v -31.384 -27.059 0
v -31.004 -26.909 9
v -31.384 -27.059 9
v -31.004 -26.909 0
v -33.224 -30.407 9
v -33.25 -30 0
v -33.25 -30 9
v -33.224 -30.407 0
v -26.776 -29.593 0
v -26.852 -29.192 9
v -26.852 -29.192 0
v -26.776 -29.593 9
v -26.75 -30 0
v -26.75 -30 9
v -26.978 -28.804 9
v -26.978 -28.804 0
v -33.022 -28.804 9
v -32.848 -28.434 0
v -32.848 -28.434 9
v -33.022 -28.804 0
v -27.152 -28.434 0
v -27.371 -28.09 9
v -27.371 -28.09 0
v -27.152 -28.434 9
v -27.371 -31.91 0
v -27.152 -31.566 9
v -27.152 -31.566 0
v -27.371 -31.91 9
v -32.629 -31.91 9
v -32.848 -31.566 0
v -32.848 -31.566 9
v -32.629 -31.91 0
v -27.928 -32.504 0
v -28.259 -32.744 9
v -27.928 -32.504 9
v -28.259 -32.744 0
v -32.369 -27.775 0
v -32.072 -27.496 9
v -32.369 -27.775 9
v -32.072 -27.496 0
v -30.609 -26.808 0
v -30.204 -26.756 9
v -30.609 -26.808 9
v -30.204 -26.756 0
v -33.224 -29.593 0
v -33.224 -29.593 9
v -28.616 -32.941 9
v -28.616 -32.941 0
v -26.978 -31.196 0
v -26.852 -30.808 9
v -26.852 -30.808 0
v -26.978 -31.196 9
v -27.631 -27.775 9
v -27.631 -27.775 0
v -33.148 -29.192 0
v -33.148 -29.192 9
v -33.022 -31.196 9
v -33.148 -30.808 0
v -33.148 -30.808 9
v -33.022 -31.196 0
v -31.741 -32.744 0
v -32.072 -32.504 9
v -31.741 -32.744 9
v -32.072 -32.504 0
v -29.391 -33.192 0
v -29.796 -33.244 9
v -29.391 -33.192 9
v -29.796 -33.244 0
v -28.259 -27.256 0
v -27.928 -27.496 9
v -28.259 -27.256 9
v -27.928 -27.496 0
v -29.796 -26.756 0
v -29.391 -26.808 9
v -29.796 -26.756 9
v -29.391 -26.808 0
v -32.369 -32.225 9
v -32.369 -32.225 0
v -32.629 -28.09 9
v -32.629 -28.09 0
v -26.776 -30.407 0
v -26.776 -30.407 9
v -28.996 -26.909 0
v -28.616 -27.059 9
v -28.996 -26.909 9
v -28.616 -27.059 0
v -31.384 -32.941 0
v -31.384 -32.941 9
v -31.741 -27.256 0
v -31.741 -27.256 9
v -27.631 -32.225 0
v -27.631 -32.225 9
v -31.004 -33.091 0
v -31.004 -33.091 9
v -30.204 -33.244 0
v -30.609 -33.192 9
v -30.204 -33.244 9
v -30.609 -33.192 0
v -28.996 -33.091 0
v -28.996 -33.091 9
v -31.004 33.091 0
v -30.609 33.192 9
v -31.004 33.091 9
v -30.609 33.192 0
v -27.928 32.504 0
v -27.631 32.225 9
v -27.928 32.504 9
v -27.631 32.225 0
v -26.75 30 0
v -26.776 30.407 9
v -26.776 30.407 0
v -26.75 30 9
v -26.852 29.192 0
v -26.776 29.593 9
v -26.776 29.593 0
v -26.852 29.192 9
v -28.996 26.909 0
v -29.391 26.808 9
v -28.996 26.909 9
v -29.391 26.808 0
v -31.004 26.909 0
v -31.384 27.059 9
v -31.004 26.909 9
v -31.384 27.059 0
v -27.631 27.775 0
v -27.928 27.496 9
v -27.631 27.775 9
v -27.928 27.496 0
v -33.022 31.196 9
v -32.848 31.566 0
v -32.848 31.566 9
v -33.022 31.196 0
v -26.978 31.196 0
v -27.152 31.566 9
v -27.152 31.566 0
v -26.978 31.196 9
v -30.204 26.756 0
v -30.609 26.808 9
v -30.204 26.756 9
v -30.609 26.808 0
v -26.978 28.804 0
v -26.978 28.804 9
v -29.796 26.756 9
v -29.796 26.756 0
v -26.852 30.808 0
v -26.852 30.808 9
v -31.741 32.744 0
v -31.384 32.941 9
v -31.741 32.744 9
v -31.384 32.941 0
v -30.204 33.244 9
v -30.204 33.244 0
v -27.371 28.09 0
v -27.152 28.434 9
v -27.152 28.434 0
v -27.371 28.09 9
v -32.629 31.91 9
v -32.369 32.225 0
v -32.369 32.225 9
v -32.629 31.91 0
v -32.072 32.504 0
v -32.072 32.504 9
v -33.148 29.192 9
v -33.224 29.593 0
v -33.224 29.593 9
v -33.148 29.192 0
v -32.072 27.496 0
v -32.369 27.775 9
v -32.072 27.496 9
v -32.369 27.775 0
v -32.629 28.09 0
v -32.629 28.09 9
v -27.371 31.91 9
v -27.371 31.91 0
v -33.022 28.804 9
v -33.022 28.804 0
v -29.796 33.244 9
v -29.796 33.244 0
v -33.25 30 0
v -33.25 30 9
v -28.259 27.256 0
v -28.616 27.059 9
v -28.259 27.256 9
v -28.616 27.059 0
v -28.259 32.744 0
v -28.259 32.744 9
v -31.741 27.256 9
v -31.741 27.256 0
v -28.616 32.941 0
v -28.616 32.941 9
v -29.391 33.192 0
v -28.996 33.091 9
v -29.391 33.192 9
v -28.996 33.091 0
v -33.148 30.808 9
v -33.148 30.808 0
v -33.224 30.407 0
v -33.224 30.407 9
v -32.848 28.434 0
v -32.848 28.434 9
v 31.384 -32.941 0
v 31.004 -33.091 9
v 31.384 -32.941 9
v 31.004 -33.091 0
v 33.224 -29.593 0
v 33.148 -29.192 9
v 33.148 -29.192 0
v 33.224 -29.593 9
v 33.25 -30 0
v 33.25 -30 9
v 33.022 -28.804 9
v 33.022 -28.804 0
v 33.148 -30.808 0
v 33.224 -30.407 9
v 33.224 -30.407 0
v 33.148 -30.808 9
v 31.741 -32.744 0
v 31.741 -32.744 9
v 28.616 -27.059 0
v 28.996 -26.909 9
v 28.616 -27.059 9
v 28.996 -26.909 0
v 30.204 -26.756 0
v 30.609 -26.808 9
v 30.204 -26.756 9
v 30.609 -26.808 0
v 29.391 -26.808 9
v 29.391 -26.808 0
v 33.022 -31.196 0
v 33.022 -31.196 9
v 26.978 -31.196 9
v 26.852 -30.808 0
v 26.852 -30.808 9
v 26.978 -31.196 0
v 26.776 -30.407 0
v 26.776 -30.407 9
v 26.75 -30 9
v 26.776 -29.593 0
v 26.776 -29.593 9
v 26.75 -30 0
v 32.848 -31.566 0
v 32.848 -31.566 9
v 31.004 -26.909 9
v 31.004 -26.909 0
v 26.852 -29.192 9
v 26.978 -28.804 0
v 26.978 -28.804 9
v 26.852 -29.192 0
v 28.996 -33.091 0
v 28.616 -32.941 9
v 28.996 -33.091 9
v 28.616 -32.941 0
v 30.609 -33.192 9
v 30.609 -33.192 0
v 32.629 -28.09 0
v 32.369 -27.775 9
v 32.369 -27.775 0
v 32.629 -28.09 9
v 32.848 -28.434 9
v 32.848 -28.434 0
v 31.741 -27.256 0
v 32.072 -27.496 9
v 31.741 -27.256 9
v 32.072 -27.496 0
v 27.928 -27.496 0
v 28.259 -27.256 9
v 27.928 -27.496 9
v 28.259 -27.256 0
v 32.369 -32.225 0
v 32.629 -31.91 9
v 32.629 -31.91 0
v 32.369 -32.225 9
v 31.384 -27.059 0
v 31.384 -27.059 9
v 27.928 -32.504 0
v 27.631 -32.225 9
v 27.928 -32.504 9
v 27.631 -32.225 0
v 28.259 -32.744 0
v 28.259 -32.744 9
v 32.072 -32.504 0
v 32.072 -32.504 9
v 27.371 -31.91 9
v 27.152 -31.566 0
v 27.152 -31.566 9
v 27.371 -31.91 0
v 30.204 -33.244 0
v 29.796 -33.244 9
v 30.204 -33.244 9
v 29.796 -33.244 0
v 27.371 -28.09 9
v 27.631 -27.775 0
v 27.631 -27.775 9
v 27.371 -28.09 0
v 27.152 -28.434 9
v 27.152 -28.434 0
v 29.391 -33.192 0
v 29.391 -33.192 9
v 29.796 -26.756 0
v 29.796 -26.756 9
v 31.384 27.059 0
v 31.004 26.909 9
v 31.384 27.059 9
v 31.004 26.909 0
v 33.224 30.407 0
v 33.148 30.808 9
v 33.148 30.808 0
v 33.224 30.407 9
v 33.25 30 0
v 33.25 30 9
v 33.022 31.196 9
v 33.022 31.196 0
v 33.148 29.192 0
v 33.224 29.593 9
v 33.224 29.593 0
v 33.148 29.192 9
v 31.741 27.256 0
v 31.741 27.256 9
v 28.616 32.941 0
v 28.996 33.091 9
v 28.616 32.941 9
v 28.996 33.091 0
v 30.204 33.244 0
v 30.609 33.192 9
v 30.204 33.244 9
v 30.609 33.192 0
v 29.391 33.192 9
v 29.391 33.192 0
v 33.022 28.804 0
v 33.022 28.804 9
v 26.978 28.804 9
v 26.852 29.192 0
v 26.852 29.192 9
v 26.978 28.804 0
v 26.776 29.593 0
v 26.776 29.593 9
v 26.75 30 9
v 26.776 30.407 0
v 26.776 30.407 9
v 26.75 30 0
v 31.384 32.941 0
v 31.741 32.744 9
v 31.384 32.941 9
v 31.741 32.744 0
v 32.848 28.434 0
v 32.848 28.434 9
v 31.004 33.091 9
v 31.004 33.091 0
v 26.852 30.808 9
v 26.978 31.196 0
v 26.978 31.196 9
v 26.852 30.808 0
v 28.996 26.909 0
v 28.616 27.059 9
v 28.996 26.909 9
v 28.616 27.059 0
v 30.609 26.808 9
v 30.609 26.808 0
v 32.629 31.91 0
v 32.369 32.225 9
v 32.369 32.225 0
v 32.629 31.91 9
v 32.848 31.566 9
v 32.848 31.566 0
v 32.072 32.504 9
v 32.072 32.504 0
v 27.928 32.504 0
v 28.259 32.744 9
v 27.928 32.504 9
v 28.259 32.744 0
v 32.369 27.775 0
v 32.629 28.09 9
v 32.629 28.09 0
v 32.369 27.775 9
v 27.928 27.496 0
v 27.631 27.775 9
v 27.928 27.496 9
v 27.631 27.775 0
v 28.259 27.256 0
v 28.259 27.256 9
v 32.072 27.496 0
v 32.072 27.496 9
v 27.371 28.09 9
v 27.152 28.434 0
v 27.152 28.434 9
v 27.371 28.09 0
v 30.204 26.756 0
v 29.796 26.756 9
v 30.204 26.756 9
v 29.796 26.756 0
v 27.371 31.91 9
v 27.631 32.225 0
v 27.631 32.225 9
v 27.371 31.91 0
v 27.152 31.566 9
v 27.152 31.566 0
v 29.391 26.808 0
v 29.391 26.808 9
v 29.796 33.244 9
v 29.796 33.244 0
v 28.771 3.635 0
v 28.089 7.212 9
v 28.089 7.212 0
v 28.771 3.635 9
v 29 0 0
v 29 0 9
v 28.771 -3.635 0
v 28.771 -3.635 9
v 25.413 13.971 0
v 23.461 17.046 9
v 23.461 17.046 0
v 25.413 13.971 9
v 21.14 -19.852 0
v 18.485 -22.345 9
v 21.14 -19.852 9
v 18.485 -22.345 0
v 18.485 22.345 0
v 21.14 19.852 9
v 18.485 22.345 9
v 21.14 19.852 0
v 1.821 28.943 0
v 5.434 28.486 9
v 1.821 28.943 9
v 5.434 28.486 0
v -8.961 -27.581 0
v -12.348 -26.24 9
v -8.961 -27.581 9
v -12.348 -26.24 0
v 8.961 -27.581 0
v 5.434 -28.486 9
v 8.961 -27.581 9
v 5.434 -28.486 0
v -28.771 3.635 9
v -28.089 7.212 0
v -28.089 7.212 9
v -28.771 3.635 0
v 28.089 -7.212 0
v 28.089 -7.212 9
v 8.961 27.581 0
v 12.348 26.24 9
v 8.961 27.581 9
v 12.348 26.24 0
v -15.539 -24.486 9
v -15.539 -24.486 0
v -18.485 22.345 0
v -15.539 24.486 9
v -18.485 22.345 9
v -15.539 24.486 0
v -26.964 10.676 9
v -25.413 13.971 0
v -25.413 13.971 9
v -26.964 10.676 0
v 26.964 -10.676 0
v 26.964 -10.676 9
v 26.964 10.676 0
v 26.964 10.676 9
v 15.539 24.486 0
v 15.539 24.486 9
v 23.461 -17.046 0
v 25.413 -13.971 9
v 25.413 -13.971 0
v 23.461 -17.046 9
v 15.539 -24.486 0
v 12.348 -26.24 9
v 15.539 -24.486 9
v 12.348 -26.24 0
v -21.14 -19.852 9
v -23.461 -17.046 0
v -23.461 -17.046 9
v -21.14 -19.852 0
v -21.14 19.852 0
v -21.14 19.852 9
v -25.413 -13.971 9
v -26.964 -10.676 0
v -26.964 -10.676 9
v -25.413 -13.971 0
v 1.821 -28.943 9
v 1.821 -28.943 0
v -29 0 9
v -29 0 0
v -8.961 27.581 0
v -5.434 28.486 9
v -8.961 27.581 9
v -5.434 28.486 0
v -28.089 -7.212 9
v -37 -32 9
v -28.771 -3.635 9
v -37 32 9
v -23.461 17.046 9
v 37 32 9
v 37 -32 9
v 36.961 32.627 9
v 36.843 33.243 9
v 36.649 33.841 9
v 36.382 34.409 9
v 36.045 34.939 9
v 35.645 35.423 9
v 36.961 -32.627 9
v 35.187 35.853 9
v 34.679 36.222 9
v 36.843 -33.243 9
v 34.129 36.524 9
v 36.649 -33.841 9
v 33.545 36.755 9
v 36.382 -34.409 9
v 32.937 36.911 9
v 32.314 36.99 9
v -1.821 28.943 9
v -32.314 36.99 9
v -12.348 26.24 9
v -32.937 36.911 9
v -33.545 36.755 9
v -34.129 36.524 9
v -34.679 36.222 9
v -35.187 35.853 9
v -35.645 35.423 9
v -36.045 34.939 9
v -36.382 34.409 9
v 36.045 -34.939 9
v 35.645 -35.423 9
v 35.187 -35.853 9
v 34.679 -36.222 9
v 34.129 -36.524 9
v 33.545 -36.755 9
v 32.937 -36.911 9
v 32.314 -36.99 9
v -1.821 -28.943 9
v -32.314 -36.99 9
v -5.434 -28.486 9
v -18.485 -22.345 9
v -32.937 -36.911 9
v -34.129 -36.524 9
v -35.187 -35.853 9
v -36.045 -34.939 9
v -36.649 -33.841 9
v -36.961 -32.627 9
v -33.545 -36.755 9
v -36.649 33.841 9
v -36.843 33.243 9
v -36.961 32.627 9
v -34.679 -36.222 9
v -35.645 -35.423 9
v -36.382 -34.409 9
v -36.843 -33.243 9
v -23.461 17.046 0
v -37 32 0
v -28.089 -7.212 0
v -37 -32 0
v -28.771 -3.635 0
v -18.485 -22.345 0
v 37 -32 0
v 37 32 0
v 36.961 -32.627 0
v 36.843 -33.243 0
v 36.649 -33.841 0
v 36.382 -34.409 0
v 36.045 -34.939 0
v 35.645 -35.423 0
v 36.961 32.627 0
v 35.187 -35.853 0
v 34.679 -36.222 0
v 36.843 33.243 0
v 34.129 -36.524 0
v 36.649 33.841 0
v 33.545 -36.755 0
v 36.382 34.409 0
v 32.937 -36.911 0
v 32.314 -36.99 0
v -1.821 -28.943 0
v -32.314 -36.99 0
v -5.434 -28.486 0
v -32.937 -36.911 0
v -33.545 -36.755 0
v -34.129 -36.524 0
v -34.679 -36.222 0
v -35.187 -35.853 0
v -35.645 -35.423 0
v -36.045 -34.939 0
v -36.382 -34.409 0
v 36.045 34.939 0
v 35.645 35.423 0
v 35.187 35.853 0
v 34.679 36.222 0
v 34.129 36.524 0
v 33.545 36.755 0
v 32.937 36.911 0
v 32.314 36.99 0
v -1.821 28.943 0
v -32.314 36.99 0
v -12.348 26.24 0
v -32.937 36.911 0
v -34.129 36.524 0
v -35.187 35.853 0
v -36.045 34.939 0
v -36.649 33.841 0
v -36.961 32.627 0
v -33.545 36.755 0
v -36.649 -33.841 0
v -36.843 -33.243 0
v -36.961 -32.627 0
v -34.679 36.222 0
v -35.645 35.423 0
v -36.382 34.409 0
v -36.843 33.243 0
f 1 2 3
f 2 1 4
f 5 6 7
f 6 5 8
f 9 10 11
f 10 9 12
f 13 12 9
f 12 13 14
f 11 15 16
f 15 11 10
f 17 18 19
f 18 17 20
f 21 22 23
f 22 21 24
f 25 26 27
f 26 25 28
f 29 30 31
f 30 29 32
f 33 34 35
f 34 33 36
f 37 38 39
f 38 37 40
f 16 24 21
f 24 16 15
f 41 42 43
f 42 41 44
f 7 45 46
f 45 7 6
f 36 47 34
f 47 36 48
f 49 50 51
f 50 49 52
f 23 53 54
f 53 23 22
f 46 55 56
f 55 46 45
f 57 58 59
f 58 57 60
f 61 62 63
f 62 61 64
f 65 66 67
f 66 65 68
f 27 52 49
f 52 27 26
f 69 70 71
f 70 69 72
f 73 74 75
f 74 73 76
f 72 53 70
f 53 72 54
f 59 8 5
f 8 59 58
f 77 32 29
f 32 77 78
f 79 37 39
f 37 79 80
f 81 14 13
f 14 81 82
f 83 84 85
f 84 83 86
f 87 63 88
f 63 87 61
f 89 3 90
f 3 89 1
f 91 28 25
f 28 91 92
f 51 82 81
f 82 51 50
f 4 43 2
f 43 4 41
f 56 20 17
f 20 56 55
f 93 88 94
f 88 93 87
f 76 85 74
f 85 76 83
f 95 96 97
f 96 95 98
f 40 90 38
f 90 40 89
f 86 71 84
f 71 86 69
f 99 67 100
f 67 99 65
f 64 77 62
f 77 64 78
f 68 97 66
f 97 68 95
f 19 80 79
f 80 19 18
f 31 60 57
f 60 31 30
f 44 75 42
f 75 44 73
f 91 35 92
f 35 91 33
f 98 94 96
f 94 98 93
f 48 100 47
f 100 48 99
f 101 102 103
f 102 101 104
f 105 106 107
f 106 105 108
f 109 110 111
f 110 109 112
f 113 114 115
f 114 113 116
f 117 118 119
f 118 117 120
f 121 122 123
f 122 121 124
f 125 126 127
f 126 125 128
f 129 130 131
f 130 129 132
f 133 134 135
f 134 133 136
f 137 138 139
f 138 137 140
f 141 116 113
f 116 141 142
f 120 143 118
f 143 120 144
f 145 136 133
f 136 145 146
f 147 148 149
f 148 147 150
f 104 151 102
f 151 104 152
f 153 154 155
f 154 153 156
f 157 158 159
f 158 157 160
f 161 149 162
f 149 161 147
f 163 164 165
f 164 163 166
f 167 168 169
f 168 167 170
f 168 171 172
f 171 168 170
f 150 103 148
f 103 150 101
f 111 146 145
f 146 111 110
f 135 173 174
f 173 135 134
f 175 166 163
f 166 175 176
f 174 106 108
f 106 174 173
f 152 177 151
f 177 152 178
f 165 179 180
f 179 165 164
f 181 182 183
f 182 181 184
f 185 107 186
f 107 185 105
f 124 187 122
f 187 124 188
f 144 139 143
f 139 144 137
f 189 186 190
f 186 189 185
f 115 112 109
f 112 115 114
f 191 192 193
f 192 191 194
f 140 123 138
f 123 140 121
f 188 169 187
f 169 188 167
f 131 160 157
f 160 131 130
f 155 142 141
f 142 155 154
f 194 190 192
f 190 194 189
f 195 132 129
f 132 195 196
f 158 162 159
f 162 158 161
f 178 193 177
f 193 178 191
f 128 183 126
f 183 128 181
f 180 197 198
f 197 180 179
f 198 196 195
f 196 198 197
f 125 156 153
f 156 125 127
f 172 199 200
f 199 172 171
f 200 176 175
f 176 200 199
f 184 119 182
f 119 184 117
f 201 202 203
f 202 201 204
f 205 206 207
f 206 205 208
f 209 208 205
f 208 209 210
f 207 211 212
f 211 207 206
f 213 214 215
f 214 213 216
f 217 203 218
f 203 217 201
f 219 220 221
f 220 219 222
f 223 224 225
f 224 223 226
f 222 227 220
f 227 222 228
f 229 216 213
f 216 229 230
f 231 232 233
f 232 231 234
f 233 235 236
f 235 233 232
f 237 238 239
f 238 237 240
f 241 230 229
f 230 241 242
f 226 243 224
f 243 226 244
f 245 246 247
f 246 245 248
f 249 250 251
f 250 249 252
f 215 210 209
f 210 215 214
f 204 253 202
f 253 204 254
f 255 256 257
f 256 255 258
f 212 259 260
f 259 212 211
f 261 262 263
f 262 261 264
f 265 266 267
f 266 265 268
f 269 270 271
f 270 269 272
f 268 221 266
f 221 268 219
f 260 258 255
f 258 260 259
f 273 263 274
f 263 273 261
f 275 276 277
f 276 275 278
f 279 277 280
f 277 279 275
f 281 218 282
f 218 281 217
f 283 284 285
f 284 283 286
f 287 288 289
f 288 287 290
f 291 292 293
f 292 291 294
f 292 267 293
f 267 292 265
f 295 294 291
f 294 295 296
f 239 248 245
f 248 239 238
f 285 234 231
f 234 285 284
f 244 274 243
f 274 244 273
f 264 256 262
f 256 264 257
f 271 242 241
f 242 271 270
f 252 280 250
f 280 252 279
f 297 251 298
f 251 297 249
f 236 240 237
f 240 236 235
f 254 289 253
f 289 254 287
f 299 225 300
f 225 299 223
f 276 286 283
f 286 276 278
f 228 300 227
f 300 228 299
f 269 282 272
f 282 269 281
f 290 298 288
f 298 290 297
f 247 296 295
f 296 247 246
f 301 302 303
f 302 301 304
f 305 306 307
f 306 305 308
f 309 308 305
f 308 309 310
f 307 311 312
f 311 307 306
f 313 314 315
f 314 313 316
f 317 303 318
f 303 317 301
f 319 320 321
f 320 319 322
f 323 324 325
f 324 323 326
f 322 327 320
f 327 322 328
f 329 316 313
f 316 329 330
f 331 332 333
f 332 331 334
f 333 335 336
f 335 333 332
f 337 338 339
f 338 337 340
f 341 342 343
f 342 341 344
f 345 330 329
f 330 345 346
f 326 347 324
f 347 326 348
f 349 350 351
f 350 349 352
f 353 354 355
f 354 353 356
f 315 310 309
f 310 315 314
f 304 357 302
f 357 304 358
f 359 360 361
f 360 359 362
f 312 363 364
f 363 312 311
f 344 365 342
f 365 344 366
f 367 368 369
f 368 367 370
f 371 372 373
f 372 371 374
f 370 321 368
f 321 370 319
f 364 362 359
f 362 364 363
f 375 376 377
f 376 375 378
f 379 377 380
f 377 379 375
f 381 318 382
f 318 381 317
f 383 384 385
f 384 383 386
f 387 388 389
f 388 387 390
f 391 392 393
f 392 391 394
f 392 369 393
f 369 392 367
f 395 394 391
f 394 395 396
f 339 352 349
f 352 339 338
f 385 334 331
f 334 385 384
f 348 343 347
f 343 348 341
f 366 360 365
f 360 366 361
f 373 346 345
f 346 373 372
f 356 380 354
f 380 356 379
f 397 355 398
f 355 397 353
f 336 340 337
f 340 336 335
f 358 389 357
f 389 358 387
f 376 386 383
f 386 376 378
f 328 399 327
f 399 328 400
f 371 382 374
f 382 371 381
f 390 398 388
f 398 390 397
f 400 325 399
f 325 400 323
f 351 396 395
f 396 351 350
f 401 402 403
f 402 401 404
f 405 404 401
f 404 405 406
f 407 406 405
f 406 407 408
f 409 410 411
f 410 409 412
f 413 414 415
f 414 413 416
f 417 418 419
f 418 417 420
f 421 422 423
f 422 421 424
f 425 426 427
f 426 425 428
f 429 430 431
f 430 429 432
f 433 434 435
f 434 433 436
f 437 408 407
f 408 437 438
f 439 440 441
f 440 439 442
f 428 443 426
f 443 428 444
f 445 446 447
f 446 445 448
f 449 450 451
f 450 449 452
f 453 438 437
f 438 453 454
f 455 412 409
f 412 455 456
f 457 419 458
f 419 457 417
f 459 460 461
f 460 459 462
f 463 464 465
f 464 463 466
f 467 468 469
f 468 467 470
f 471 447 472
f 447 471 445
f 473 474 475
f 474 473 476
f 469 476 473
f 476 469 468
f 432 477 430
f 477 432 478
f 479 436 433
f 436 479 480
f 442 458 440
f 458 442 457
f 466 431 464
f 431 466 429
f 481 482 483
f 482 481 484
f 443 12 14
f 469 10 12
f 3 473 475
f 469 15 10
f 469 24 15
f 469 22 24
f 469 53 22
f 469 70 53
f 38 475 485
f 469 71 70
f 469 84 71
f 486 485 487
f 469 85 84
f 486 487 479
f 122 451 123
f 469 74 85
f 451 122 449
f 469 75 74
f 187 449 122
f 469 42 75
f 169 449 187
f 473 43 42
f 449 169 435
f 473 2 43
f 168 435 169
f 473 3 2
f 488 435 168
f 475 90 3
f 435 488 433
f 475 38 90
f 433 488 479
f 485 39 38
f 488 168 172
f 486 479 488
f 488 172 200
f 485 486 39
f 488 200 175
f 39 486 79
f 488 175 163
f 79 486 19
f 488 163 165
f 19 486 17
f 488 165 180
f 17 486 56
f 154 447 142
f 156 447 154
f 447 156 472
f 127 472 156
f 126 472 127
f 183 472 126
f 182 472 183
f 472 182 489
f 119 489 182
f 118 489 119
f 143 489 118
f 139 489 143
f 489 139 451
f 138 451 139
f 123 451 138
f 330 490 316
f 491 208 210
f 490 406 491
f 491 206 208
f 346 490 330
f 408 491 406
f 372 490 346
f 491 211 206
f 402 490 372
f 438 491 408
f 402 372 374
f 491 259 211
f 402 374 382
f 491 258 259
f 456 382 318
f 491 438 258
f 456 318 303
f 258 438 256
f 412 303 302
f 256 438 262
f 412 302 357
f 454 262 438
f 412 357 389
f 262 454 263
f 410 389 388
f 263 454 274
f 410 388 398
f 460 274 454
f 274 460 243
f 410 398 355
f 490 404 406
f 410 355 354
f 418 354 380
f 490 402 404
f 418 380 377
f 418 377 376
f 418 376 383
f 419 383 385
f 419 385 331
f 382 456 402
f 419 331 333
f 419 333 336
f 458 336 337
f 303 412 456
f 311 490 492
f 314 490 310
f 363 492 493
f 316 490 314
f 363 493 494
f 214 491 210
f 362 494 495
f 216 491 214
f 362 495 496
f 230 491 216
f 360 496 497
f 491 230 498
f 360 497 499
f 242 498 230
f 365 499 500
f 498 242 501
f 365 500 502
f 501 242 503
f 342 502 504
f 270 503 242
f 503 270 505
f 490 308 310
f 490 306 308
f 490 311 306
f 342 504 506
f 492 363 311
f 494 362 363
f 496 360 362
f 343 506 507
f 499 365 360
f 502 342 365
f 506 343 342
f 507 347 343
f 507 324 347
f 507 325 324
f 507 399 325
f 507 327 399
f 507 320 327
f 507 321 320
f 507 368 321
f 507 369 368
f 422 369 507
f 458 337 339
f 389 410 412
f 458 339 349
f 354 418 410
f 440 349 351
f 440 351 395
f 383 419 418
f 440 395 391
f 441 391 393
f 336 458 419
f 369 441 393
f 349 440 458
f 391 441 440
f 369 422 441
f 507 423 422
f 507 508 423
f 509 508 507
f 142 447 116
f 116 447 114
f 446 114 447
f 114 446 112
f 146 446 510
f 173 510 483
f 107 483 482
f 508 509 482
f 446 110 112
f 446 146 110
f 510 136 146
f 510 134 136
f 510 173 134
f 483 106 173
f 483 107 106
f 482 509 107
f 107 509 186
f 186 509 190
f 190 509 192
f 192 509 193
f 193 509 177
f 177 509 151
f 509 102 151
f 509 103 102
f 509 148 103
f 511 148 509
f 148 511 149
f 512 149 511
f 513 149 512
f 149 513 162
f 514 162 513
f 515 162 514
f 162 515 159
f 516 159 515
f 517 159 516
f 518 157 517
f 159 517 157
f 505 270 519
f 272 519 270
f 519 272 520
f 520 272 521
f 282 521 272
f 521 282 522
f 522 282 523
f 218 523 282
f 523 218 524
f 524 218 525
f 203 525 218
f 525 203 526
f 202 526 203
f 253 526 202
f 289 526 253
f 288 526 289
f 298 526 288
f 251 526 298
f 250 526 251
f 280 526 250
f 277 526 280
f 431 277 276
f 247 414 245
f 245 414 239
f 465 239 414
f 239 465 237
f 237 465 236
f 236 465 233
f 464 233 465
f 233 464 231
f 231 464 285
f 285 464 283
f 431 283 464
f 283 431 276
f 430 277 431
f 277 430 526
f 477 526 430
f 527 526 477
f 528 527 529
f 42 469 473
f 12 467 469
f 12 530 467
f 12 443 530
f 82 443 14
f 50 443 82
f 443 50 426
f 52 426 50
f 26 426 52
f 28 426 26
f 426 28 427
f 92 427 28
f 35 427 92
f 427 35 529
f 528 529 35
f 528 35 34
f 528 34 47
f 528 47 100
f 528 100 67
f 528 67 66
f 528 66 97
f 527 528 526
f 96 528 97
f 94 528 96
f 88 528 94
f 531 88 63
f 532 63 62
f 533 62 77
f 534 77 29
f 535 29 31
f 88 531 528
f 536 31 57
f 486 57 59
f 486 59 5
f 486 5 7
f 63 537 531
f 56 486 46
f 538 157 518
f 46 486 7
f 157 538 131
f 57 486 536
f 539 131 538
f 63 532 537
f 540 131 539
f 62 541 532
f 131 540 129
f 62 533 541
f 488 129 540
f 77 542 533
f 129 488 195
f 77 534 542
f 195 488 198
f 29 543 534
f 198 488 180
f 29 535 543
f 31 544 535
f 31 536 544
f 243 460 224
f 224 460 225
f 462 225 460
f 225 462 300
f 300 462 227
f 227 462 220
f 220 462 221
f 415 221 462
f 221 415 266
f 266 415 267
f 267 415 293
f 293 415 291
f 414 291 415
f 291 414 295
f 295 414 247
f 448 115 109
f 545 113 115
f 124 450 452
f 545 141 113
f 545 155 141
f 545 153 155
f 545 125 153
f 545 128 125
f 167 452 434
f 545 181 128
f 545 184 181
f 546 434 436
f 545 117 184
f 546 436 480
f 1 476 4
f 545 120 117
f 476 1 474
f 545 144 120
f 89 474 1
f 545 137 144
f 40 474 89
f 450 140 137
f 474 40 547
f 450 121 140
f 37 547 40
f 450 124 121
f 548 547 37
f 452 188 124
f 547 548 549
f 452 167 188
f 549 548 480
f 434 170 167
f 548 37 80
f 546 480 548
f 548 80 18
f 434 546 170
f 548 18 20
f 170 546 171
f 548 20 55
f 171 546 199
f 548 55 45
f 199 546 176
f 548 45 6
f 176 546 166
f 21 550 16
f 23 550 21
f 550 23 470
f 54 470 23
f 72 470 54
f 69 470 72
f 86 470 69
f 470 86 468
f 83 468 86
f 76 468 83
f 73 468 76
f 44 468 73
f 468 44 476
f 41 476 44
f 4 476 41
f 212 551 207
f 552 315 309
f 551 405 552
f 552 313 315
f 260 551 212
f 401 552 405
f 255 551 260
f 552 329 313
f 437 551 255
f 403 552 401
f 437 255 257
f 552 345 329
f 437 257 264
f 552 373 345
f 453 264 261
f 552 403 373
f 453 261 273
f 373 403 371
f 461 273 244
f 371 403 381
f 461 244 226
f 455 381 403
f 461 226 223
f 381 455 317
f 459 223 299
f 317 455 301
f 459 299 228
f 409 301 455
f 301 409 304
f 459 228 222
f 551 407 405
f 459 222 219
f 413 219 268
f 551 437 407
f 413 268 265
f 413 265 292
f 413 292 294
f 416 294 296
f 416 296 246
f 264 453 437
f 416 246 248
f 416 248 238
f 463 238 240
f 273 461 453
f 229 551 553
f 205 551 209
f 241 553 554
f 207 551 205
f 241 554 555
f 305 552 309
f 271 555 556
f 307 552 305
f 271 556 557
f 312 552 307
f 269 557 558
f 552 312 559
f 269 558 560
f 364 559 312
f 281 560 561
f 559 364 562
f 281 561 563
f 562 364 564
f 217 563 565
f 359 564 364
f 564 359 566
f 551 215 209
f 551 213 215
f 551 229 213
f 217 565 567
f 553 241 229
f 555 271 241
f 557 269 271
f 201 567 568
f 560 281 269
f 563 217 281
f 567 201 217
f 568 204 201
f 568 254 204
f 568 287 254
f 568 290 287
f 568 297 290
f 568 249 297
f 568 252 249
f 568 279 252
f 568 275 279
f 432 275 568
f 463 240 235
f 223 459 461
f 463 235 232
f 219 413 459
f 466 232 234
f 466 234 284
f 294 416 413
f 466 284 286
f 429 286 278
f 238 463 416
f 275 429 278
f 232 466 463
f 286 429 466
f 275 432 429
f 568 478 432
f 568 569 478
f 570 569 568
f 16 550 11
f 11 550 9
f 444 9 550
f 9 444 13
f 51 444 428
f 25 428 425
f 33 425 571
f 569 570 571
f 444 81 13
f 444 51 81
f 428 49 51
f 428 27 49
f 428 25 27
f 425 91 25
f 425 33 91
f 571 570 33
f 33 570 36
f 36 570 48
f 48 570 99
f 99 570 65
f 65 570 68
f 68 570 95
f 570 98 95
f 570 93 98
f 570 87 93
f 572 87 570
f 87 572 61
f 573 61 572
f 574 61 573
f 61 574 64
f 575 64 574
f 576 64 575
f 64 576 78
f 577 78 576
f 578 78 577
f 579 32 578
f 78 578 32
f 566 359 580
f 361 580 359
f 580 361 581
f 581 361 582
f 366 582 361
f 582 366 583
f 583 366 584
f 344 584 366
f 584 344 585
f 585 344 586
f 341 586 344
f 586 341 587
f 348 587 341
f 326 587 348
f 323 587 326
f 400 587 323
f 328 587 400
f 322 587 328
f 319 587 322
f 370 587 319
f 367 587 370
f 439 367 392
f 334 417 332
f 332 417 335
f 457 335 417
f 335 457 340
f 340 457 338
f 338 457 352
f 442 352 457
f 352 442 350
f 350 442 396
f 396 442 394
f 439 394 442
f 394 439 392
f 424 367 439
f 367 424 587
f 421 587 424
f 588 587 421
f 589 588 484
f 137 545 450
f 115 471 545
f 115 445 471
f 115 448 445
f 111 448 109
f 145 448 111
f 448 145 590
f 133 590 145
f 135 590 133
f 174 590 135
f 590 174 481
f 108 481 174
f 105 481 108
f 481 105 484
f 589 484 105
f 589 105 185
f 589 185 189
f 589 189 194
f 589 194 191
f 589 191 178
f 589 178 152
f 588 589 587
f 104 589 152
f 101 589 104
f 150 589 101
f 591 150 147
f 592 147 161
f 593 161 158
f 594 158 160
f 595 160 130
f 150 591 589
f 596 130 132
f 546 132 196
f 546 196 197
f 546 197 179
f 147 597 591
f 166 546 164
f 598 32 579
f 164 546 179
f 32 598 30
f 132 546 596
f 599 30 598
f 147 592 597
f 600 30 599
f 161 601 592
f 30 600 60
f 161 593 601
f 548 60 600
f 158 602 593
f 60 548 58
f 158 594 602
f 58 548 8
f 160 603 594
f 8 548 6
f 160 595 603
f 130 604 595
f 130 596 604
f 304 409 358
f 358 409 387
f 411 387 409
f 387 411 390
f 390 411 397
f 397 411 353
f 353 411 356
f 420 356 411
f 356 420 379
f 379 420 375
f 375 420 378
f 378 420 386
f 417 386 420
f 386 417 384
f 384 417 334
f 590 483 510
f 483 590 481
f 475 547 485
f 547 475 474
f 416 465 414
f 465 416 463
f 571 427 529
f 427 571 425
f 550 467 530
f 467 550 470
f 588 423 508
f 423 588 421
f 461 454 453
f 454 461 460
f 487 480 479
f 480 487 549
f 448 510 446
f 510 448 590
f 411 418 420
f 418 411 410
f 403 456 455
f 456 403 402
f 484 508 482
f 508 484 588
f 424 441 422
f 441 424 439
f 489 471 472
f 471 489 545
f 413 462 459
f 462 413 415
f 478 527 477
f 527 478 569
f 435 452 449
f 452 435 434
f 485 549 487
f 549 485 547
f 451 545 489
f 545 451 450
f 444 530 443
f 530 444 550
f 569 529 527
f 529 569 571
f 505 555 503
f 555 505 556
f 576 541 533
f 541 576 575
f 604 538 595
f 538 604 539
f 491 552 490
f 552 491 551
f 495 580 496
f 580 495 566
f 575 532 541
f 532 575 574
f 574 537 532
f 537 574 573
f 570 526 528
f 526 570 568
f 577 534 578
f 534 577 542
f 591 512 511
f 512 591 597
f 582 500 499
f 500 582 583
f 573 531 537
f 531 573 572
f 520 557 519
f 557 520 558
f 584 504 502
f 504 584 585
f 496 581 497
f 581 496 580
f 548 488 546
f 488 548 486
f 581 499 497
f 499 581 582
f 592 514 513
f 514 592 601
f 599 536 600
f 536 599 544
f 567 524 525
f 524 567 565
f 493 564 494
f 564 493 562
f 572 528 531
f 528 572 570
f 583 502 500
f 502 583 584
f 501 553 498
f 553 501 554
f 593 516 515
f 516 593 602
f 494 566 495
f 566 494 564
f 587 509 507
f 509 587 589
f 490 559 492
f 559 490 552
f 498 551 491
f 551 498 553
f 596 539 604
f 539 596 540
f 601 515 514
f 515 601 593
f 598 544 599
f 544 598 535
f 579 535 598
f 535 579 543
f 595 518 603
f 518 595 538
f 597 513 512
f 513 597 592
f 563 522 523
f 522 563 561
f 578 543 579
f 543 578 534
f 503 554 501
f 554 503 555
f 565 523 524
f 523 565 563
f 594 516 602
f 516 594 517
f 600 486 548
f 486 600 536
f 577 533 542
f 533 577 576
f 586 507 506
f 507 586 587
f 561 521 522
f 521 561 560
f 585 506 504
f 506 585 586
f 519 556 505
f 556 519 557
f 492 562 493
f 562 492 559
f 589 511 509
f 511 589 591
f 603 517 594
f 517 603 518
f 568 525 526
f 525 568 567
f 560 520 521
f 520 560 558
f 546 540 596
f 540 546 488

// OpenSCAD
$fn = 50;


difference() {
	union() {
		hull() {
			translate(v = [-32.0000000000, 32.0000000000, 0]) {
				cylinder(h = 9, r = 5);
			}
			translate(v = [32.0000000000, 32.0000000000, 0]) {
				cylinder(h = 9, r = 5);
			}
			translate(v = [-32.0000000000, -32.0000000000, 0]) {
				cylinder(h = 9, r = 5);
			}
			translate(v = [32.0000000000, -32.0000000000, 0]) {
				cylinder(h = 9, r = 5);
			}
		}
	}
	union() {
		#translate(v = [-30.0000000000, -30.0000000000, -100.0000000000]) {
			cylinder(h = 200, r = 3.2500000000);
		}
		#translate(v = [-30.0000000000, 30.0000000000, -100.0000000000]) {
			cylinder(h = 200, r = 3.2500000000);
		}
		#translate(v = [30.0000000000, -30.0000000000, -100.0000000000]) {
			cylinder(h = 200, r = 3.2500000000);
		}
		#translate(v = [30.0000000000, 30.0000000000, -100.0000000000]) {
			cylinder(h = 200, r = 3.2500000000);
		}
		#cylinder(h = 9, r = 29.0000000000);
	}
}
